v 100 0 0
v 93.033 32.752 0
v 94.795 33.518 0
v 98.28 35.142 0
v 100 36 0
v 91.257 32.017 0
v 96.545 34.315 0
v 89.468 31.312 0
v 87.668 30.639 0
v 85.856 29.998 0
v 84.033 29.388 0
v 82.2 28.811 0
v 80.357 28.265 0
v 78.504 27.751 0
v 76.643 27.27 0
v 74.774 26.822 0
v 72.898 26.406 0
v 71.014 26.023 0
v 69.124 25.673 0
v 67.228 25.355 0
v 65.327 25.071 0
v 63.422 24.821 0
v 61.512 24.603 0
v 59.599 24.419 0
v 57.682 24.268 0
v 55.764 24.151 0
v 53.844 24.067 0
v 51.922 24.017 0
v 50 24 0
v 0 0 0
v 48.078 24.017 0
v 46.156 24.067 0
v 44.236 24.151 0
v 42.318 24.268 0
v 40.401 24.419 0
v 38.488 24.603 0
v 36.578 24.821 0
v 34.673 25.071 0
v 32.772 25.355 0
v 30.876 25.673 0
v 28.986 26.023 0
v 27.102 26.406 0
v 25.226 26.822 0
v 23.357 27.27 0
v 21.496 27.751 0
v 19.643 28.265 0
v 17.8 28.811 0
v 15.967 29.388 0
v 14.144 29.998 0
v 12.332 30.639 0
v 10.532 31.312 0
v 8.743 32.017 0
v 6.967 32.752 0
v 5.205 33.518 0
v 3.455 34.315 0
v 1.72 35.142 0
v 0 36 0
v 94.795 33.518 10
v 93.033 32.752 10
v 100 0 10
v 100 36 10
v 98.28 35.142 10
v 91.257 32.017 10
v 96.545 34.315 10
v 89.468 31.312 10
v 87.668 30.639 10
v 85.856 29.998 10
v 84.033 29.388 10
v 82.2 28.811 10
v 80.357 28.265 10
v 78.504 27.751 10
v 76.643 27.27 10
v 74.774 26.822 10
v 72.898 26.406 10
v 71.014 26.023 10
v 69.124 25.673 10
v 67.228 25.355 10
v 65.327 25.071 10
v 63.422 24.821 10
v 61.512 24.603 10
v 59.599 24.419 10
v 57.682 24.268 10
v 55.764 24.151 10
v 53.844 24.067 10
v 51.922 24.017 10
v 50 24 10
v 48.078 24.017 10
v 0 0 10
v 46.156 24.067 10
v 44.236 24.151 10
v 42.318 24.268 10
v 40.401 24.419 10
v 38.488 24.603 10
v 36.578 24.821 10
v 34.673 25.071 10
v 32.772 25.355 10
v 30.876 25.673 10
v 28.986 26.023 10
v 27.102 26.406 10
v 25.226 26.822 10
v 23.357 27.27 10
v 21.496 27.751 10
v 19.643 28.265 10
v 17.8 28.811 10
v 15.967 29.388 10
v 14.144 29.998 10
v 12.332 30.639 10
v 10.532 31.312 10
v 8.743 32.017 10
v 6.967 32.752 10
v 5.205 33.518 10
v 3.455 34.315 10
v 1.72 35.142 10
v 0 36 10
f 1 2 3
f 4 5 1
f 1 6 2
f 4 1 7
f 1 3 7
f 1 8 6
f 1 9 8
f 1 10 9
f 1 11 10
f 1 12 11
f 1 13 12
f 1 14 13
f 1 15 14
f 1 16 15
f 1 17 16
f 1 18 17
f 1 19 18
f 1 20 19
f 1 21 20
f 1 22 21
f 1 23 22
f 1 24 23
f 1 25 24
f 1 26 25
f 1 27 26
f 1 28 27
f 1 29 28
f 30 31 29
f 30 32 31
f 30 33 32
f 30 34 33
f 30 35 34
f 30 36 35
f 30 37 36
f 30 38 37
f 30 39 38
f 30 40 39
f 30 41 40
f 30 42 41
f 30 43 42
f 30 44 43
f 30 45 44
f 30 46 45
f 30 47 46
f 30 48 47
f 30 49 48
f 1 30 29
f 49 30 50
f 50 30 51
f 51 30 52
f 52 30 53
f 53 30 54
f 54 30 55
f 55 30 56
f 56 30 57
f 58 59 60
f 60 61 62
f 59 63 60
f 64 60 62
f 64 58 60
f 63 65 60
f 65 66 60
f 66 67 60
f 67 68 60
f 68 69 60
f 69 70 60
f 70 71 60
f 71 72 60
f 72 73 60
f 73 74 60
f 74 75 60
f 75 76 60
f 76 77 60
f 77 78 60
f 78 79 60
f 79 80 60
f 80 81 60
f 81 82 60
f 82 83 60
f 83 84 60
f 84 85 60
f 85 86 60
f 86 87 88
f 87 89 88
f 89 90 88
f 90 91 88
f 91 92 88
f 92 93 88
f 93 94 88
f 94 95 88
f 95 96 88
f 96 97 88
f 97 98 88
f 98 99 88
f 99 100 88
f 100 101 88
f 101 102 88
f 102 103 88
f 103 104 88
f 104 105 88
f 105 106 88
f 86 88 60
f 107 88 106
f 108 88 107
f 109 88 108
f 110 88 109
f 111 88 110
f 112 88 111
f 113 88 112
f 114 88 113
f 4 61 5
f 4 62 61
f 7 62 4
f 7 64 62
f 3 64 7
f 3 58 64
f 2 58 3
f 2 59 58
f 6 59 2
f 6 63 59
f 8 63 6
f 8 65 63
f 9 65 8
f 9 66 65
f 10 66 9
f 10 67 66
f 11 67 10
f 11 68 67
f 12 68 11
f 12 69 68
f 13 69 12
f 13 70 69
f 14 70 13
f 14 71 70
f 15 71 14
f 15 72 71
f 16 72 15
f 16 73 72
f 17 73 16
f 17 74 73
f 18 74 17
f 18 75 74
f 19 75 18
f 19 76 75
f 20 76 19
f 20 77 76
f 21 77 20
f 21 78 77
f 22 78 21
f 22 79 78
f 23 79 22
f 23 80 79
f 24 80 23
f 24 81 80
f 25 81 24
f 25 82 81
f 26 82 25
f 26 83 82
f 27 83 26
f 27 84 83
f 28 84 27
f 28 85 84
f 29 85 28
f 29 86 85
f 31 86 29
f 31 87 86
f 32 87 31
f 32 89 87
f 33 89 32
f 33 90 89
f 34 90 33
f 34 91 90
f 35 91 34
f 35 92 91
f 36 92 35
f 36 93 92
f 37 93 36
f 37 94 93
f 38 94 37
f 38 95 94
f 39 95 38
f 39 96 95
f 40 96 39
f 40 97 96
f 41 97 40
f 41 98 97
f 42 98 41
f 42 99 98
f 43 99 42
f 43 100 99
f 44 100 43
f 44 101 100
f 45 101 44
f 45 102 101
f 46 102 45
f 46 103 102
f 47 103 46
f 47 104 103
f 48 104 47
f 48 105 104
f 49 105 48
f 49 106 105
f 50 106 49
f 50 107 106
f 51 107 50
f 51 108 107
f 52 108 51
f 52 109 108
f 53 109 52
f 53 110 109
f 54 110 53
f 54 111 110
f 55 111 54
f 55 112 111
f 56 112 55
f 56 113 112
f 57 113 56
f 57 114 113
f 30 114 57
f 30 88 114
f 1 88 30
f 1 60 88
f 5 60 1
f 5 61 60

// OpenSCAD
$fn = 32;

// ----------------------------------------------------------------------
// Arc profile plate: notch, 57 points
// ----------------------------------------------------------------------

// --- parameters (mm) ---
bar_l = 100;              // bar length, X
bar_w = 36;               // bar width, Y
notch_depth = 12;         // depth of the arc notch at mid-span
arc_r = 110.17;           // radius of the notch arc
arc_angle = 53.98;        // notch arc angle, degrees
arc_step = 1;             // sampling step of the notch arc, degrees
plate_t = 10;             // plate thickness, Z

profile = [[0, 0], [100, 0], [100, 36], [98.28, 35.142], [96.545, 34.315], [94.795, 33.518], [93.033, 32.752], [91.257, 32.017], [89.468, 31.312], [87.668, 30.639], [85.856, 29.998], [84.033, 29.388], [82.2, 28.811], [80.357, 28.265], [78.504, 27.751], [76.643, 27.27], [74.774, 26.822], [72.898, 26.406], [71.014, 26.023], [69.124, 25.673], [67.228, 25.355], [65.327, 25.071], [63.422, 24.821], [61.512, 24.603], [59.599, 24.419], [57.682, 24.268], [55.764, 24.151], [53.844, 24.067], [51.922, 24.017], [50, 24], [48.078, 24.017], [46.156, 24.067], [44.236, 24.151], [42.318, 24.268], [40.401, 24.419], [38.488, 24.603], [36.578, 24.821], [34.673, 25.071], [32.772, 25.355], [30.876, 25.673], [28.986, 26.023], [27.102, 26.406], [25.226, 26.822], [23.357, 27.27], [21.496, 27.751], [19.643, 28.265], [17.8, 28.811], [15.967, 29.388], [14.144, 29.998], [12.332, 30.639], [10.532, 31.312], [8.743, 32.017], [6.967, 32.752], [5.205, 33.518], [3.455, 34.315], [1.72, 35.142], [0, 36]];  // primary outline, 57 points, counter clockwise

// --- the one profile operation ---
linear_extrude(height = plate_t) polygon(points = profile);
